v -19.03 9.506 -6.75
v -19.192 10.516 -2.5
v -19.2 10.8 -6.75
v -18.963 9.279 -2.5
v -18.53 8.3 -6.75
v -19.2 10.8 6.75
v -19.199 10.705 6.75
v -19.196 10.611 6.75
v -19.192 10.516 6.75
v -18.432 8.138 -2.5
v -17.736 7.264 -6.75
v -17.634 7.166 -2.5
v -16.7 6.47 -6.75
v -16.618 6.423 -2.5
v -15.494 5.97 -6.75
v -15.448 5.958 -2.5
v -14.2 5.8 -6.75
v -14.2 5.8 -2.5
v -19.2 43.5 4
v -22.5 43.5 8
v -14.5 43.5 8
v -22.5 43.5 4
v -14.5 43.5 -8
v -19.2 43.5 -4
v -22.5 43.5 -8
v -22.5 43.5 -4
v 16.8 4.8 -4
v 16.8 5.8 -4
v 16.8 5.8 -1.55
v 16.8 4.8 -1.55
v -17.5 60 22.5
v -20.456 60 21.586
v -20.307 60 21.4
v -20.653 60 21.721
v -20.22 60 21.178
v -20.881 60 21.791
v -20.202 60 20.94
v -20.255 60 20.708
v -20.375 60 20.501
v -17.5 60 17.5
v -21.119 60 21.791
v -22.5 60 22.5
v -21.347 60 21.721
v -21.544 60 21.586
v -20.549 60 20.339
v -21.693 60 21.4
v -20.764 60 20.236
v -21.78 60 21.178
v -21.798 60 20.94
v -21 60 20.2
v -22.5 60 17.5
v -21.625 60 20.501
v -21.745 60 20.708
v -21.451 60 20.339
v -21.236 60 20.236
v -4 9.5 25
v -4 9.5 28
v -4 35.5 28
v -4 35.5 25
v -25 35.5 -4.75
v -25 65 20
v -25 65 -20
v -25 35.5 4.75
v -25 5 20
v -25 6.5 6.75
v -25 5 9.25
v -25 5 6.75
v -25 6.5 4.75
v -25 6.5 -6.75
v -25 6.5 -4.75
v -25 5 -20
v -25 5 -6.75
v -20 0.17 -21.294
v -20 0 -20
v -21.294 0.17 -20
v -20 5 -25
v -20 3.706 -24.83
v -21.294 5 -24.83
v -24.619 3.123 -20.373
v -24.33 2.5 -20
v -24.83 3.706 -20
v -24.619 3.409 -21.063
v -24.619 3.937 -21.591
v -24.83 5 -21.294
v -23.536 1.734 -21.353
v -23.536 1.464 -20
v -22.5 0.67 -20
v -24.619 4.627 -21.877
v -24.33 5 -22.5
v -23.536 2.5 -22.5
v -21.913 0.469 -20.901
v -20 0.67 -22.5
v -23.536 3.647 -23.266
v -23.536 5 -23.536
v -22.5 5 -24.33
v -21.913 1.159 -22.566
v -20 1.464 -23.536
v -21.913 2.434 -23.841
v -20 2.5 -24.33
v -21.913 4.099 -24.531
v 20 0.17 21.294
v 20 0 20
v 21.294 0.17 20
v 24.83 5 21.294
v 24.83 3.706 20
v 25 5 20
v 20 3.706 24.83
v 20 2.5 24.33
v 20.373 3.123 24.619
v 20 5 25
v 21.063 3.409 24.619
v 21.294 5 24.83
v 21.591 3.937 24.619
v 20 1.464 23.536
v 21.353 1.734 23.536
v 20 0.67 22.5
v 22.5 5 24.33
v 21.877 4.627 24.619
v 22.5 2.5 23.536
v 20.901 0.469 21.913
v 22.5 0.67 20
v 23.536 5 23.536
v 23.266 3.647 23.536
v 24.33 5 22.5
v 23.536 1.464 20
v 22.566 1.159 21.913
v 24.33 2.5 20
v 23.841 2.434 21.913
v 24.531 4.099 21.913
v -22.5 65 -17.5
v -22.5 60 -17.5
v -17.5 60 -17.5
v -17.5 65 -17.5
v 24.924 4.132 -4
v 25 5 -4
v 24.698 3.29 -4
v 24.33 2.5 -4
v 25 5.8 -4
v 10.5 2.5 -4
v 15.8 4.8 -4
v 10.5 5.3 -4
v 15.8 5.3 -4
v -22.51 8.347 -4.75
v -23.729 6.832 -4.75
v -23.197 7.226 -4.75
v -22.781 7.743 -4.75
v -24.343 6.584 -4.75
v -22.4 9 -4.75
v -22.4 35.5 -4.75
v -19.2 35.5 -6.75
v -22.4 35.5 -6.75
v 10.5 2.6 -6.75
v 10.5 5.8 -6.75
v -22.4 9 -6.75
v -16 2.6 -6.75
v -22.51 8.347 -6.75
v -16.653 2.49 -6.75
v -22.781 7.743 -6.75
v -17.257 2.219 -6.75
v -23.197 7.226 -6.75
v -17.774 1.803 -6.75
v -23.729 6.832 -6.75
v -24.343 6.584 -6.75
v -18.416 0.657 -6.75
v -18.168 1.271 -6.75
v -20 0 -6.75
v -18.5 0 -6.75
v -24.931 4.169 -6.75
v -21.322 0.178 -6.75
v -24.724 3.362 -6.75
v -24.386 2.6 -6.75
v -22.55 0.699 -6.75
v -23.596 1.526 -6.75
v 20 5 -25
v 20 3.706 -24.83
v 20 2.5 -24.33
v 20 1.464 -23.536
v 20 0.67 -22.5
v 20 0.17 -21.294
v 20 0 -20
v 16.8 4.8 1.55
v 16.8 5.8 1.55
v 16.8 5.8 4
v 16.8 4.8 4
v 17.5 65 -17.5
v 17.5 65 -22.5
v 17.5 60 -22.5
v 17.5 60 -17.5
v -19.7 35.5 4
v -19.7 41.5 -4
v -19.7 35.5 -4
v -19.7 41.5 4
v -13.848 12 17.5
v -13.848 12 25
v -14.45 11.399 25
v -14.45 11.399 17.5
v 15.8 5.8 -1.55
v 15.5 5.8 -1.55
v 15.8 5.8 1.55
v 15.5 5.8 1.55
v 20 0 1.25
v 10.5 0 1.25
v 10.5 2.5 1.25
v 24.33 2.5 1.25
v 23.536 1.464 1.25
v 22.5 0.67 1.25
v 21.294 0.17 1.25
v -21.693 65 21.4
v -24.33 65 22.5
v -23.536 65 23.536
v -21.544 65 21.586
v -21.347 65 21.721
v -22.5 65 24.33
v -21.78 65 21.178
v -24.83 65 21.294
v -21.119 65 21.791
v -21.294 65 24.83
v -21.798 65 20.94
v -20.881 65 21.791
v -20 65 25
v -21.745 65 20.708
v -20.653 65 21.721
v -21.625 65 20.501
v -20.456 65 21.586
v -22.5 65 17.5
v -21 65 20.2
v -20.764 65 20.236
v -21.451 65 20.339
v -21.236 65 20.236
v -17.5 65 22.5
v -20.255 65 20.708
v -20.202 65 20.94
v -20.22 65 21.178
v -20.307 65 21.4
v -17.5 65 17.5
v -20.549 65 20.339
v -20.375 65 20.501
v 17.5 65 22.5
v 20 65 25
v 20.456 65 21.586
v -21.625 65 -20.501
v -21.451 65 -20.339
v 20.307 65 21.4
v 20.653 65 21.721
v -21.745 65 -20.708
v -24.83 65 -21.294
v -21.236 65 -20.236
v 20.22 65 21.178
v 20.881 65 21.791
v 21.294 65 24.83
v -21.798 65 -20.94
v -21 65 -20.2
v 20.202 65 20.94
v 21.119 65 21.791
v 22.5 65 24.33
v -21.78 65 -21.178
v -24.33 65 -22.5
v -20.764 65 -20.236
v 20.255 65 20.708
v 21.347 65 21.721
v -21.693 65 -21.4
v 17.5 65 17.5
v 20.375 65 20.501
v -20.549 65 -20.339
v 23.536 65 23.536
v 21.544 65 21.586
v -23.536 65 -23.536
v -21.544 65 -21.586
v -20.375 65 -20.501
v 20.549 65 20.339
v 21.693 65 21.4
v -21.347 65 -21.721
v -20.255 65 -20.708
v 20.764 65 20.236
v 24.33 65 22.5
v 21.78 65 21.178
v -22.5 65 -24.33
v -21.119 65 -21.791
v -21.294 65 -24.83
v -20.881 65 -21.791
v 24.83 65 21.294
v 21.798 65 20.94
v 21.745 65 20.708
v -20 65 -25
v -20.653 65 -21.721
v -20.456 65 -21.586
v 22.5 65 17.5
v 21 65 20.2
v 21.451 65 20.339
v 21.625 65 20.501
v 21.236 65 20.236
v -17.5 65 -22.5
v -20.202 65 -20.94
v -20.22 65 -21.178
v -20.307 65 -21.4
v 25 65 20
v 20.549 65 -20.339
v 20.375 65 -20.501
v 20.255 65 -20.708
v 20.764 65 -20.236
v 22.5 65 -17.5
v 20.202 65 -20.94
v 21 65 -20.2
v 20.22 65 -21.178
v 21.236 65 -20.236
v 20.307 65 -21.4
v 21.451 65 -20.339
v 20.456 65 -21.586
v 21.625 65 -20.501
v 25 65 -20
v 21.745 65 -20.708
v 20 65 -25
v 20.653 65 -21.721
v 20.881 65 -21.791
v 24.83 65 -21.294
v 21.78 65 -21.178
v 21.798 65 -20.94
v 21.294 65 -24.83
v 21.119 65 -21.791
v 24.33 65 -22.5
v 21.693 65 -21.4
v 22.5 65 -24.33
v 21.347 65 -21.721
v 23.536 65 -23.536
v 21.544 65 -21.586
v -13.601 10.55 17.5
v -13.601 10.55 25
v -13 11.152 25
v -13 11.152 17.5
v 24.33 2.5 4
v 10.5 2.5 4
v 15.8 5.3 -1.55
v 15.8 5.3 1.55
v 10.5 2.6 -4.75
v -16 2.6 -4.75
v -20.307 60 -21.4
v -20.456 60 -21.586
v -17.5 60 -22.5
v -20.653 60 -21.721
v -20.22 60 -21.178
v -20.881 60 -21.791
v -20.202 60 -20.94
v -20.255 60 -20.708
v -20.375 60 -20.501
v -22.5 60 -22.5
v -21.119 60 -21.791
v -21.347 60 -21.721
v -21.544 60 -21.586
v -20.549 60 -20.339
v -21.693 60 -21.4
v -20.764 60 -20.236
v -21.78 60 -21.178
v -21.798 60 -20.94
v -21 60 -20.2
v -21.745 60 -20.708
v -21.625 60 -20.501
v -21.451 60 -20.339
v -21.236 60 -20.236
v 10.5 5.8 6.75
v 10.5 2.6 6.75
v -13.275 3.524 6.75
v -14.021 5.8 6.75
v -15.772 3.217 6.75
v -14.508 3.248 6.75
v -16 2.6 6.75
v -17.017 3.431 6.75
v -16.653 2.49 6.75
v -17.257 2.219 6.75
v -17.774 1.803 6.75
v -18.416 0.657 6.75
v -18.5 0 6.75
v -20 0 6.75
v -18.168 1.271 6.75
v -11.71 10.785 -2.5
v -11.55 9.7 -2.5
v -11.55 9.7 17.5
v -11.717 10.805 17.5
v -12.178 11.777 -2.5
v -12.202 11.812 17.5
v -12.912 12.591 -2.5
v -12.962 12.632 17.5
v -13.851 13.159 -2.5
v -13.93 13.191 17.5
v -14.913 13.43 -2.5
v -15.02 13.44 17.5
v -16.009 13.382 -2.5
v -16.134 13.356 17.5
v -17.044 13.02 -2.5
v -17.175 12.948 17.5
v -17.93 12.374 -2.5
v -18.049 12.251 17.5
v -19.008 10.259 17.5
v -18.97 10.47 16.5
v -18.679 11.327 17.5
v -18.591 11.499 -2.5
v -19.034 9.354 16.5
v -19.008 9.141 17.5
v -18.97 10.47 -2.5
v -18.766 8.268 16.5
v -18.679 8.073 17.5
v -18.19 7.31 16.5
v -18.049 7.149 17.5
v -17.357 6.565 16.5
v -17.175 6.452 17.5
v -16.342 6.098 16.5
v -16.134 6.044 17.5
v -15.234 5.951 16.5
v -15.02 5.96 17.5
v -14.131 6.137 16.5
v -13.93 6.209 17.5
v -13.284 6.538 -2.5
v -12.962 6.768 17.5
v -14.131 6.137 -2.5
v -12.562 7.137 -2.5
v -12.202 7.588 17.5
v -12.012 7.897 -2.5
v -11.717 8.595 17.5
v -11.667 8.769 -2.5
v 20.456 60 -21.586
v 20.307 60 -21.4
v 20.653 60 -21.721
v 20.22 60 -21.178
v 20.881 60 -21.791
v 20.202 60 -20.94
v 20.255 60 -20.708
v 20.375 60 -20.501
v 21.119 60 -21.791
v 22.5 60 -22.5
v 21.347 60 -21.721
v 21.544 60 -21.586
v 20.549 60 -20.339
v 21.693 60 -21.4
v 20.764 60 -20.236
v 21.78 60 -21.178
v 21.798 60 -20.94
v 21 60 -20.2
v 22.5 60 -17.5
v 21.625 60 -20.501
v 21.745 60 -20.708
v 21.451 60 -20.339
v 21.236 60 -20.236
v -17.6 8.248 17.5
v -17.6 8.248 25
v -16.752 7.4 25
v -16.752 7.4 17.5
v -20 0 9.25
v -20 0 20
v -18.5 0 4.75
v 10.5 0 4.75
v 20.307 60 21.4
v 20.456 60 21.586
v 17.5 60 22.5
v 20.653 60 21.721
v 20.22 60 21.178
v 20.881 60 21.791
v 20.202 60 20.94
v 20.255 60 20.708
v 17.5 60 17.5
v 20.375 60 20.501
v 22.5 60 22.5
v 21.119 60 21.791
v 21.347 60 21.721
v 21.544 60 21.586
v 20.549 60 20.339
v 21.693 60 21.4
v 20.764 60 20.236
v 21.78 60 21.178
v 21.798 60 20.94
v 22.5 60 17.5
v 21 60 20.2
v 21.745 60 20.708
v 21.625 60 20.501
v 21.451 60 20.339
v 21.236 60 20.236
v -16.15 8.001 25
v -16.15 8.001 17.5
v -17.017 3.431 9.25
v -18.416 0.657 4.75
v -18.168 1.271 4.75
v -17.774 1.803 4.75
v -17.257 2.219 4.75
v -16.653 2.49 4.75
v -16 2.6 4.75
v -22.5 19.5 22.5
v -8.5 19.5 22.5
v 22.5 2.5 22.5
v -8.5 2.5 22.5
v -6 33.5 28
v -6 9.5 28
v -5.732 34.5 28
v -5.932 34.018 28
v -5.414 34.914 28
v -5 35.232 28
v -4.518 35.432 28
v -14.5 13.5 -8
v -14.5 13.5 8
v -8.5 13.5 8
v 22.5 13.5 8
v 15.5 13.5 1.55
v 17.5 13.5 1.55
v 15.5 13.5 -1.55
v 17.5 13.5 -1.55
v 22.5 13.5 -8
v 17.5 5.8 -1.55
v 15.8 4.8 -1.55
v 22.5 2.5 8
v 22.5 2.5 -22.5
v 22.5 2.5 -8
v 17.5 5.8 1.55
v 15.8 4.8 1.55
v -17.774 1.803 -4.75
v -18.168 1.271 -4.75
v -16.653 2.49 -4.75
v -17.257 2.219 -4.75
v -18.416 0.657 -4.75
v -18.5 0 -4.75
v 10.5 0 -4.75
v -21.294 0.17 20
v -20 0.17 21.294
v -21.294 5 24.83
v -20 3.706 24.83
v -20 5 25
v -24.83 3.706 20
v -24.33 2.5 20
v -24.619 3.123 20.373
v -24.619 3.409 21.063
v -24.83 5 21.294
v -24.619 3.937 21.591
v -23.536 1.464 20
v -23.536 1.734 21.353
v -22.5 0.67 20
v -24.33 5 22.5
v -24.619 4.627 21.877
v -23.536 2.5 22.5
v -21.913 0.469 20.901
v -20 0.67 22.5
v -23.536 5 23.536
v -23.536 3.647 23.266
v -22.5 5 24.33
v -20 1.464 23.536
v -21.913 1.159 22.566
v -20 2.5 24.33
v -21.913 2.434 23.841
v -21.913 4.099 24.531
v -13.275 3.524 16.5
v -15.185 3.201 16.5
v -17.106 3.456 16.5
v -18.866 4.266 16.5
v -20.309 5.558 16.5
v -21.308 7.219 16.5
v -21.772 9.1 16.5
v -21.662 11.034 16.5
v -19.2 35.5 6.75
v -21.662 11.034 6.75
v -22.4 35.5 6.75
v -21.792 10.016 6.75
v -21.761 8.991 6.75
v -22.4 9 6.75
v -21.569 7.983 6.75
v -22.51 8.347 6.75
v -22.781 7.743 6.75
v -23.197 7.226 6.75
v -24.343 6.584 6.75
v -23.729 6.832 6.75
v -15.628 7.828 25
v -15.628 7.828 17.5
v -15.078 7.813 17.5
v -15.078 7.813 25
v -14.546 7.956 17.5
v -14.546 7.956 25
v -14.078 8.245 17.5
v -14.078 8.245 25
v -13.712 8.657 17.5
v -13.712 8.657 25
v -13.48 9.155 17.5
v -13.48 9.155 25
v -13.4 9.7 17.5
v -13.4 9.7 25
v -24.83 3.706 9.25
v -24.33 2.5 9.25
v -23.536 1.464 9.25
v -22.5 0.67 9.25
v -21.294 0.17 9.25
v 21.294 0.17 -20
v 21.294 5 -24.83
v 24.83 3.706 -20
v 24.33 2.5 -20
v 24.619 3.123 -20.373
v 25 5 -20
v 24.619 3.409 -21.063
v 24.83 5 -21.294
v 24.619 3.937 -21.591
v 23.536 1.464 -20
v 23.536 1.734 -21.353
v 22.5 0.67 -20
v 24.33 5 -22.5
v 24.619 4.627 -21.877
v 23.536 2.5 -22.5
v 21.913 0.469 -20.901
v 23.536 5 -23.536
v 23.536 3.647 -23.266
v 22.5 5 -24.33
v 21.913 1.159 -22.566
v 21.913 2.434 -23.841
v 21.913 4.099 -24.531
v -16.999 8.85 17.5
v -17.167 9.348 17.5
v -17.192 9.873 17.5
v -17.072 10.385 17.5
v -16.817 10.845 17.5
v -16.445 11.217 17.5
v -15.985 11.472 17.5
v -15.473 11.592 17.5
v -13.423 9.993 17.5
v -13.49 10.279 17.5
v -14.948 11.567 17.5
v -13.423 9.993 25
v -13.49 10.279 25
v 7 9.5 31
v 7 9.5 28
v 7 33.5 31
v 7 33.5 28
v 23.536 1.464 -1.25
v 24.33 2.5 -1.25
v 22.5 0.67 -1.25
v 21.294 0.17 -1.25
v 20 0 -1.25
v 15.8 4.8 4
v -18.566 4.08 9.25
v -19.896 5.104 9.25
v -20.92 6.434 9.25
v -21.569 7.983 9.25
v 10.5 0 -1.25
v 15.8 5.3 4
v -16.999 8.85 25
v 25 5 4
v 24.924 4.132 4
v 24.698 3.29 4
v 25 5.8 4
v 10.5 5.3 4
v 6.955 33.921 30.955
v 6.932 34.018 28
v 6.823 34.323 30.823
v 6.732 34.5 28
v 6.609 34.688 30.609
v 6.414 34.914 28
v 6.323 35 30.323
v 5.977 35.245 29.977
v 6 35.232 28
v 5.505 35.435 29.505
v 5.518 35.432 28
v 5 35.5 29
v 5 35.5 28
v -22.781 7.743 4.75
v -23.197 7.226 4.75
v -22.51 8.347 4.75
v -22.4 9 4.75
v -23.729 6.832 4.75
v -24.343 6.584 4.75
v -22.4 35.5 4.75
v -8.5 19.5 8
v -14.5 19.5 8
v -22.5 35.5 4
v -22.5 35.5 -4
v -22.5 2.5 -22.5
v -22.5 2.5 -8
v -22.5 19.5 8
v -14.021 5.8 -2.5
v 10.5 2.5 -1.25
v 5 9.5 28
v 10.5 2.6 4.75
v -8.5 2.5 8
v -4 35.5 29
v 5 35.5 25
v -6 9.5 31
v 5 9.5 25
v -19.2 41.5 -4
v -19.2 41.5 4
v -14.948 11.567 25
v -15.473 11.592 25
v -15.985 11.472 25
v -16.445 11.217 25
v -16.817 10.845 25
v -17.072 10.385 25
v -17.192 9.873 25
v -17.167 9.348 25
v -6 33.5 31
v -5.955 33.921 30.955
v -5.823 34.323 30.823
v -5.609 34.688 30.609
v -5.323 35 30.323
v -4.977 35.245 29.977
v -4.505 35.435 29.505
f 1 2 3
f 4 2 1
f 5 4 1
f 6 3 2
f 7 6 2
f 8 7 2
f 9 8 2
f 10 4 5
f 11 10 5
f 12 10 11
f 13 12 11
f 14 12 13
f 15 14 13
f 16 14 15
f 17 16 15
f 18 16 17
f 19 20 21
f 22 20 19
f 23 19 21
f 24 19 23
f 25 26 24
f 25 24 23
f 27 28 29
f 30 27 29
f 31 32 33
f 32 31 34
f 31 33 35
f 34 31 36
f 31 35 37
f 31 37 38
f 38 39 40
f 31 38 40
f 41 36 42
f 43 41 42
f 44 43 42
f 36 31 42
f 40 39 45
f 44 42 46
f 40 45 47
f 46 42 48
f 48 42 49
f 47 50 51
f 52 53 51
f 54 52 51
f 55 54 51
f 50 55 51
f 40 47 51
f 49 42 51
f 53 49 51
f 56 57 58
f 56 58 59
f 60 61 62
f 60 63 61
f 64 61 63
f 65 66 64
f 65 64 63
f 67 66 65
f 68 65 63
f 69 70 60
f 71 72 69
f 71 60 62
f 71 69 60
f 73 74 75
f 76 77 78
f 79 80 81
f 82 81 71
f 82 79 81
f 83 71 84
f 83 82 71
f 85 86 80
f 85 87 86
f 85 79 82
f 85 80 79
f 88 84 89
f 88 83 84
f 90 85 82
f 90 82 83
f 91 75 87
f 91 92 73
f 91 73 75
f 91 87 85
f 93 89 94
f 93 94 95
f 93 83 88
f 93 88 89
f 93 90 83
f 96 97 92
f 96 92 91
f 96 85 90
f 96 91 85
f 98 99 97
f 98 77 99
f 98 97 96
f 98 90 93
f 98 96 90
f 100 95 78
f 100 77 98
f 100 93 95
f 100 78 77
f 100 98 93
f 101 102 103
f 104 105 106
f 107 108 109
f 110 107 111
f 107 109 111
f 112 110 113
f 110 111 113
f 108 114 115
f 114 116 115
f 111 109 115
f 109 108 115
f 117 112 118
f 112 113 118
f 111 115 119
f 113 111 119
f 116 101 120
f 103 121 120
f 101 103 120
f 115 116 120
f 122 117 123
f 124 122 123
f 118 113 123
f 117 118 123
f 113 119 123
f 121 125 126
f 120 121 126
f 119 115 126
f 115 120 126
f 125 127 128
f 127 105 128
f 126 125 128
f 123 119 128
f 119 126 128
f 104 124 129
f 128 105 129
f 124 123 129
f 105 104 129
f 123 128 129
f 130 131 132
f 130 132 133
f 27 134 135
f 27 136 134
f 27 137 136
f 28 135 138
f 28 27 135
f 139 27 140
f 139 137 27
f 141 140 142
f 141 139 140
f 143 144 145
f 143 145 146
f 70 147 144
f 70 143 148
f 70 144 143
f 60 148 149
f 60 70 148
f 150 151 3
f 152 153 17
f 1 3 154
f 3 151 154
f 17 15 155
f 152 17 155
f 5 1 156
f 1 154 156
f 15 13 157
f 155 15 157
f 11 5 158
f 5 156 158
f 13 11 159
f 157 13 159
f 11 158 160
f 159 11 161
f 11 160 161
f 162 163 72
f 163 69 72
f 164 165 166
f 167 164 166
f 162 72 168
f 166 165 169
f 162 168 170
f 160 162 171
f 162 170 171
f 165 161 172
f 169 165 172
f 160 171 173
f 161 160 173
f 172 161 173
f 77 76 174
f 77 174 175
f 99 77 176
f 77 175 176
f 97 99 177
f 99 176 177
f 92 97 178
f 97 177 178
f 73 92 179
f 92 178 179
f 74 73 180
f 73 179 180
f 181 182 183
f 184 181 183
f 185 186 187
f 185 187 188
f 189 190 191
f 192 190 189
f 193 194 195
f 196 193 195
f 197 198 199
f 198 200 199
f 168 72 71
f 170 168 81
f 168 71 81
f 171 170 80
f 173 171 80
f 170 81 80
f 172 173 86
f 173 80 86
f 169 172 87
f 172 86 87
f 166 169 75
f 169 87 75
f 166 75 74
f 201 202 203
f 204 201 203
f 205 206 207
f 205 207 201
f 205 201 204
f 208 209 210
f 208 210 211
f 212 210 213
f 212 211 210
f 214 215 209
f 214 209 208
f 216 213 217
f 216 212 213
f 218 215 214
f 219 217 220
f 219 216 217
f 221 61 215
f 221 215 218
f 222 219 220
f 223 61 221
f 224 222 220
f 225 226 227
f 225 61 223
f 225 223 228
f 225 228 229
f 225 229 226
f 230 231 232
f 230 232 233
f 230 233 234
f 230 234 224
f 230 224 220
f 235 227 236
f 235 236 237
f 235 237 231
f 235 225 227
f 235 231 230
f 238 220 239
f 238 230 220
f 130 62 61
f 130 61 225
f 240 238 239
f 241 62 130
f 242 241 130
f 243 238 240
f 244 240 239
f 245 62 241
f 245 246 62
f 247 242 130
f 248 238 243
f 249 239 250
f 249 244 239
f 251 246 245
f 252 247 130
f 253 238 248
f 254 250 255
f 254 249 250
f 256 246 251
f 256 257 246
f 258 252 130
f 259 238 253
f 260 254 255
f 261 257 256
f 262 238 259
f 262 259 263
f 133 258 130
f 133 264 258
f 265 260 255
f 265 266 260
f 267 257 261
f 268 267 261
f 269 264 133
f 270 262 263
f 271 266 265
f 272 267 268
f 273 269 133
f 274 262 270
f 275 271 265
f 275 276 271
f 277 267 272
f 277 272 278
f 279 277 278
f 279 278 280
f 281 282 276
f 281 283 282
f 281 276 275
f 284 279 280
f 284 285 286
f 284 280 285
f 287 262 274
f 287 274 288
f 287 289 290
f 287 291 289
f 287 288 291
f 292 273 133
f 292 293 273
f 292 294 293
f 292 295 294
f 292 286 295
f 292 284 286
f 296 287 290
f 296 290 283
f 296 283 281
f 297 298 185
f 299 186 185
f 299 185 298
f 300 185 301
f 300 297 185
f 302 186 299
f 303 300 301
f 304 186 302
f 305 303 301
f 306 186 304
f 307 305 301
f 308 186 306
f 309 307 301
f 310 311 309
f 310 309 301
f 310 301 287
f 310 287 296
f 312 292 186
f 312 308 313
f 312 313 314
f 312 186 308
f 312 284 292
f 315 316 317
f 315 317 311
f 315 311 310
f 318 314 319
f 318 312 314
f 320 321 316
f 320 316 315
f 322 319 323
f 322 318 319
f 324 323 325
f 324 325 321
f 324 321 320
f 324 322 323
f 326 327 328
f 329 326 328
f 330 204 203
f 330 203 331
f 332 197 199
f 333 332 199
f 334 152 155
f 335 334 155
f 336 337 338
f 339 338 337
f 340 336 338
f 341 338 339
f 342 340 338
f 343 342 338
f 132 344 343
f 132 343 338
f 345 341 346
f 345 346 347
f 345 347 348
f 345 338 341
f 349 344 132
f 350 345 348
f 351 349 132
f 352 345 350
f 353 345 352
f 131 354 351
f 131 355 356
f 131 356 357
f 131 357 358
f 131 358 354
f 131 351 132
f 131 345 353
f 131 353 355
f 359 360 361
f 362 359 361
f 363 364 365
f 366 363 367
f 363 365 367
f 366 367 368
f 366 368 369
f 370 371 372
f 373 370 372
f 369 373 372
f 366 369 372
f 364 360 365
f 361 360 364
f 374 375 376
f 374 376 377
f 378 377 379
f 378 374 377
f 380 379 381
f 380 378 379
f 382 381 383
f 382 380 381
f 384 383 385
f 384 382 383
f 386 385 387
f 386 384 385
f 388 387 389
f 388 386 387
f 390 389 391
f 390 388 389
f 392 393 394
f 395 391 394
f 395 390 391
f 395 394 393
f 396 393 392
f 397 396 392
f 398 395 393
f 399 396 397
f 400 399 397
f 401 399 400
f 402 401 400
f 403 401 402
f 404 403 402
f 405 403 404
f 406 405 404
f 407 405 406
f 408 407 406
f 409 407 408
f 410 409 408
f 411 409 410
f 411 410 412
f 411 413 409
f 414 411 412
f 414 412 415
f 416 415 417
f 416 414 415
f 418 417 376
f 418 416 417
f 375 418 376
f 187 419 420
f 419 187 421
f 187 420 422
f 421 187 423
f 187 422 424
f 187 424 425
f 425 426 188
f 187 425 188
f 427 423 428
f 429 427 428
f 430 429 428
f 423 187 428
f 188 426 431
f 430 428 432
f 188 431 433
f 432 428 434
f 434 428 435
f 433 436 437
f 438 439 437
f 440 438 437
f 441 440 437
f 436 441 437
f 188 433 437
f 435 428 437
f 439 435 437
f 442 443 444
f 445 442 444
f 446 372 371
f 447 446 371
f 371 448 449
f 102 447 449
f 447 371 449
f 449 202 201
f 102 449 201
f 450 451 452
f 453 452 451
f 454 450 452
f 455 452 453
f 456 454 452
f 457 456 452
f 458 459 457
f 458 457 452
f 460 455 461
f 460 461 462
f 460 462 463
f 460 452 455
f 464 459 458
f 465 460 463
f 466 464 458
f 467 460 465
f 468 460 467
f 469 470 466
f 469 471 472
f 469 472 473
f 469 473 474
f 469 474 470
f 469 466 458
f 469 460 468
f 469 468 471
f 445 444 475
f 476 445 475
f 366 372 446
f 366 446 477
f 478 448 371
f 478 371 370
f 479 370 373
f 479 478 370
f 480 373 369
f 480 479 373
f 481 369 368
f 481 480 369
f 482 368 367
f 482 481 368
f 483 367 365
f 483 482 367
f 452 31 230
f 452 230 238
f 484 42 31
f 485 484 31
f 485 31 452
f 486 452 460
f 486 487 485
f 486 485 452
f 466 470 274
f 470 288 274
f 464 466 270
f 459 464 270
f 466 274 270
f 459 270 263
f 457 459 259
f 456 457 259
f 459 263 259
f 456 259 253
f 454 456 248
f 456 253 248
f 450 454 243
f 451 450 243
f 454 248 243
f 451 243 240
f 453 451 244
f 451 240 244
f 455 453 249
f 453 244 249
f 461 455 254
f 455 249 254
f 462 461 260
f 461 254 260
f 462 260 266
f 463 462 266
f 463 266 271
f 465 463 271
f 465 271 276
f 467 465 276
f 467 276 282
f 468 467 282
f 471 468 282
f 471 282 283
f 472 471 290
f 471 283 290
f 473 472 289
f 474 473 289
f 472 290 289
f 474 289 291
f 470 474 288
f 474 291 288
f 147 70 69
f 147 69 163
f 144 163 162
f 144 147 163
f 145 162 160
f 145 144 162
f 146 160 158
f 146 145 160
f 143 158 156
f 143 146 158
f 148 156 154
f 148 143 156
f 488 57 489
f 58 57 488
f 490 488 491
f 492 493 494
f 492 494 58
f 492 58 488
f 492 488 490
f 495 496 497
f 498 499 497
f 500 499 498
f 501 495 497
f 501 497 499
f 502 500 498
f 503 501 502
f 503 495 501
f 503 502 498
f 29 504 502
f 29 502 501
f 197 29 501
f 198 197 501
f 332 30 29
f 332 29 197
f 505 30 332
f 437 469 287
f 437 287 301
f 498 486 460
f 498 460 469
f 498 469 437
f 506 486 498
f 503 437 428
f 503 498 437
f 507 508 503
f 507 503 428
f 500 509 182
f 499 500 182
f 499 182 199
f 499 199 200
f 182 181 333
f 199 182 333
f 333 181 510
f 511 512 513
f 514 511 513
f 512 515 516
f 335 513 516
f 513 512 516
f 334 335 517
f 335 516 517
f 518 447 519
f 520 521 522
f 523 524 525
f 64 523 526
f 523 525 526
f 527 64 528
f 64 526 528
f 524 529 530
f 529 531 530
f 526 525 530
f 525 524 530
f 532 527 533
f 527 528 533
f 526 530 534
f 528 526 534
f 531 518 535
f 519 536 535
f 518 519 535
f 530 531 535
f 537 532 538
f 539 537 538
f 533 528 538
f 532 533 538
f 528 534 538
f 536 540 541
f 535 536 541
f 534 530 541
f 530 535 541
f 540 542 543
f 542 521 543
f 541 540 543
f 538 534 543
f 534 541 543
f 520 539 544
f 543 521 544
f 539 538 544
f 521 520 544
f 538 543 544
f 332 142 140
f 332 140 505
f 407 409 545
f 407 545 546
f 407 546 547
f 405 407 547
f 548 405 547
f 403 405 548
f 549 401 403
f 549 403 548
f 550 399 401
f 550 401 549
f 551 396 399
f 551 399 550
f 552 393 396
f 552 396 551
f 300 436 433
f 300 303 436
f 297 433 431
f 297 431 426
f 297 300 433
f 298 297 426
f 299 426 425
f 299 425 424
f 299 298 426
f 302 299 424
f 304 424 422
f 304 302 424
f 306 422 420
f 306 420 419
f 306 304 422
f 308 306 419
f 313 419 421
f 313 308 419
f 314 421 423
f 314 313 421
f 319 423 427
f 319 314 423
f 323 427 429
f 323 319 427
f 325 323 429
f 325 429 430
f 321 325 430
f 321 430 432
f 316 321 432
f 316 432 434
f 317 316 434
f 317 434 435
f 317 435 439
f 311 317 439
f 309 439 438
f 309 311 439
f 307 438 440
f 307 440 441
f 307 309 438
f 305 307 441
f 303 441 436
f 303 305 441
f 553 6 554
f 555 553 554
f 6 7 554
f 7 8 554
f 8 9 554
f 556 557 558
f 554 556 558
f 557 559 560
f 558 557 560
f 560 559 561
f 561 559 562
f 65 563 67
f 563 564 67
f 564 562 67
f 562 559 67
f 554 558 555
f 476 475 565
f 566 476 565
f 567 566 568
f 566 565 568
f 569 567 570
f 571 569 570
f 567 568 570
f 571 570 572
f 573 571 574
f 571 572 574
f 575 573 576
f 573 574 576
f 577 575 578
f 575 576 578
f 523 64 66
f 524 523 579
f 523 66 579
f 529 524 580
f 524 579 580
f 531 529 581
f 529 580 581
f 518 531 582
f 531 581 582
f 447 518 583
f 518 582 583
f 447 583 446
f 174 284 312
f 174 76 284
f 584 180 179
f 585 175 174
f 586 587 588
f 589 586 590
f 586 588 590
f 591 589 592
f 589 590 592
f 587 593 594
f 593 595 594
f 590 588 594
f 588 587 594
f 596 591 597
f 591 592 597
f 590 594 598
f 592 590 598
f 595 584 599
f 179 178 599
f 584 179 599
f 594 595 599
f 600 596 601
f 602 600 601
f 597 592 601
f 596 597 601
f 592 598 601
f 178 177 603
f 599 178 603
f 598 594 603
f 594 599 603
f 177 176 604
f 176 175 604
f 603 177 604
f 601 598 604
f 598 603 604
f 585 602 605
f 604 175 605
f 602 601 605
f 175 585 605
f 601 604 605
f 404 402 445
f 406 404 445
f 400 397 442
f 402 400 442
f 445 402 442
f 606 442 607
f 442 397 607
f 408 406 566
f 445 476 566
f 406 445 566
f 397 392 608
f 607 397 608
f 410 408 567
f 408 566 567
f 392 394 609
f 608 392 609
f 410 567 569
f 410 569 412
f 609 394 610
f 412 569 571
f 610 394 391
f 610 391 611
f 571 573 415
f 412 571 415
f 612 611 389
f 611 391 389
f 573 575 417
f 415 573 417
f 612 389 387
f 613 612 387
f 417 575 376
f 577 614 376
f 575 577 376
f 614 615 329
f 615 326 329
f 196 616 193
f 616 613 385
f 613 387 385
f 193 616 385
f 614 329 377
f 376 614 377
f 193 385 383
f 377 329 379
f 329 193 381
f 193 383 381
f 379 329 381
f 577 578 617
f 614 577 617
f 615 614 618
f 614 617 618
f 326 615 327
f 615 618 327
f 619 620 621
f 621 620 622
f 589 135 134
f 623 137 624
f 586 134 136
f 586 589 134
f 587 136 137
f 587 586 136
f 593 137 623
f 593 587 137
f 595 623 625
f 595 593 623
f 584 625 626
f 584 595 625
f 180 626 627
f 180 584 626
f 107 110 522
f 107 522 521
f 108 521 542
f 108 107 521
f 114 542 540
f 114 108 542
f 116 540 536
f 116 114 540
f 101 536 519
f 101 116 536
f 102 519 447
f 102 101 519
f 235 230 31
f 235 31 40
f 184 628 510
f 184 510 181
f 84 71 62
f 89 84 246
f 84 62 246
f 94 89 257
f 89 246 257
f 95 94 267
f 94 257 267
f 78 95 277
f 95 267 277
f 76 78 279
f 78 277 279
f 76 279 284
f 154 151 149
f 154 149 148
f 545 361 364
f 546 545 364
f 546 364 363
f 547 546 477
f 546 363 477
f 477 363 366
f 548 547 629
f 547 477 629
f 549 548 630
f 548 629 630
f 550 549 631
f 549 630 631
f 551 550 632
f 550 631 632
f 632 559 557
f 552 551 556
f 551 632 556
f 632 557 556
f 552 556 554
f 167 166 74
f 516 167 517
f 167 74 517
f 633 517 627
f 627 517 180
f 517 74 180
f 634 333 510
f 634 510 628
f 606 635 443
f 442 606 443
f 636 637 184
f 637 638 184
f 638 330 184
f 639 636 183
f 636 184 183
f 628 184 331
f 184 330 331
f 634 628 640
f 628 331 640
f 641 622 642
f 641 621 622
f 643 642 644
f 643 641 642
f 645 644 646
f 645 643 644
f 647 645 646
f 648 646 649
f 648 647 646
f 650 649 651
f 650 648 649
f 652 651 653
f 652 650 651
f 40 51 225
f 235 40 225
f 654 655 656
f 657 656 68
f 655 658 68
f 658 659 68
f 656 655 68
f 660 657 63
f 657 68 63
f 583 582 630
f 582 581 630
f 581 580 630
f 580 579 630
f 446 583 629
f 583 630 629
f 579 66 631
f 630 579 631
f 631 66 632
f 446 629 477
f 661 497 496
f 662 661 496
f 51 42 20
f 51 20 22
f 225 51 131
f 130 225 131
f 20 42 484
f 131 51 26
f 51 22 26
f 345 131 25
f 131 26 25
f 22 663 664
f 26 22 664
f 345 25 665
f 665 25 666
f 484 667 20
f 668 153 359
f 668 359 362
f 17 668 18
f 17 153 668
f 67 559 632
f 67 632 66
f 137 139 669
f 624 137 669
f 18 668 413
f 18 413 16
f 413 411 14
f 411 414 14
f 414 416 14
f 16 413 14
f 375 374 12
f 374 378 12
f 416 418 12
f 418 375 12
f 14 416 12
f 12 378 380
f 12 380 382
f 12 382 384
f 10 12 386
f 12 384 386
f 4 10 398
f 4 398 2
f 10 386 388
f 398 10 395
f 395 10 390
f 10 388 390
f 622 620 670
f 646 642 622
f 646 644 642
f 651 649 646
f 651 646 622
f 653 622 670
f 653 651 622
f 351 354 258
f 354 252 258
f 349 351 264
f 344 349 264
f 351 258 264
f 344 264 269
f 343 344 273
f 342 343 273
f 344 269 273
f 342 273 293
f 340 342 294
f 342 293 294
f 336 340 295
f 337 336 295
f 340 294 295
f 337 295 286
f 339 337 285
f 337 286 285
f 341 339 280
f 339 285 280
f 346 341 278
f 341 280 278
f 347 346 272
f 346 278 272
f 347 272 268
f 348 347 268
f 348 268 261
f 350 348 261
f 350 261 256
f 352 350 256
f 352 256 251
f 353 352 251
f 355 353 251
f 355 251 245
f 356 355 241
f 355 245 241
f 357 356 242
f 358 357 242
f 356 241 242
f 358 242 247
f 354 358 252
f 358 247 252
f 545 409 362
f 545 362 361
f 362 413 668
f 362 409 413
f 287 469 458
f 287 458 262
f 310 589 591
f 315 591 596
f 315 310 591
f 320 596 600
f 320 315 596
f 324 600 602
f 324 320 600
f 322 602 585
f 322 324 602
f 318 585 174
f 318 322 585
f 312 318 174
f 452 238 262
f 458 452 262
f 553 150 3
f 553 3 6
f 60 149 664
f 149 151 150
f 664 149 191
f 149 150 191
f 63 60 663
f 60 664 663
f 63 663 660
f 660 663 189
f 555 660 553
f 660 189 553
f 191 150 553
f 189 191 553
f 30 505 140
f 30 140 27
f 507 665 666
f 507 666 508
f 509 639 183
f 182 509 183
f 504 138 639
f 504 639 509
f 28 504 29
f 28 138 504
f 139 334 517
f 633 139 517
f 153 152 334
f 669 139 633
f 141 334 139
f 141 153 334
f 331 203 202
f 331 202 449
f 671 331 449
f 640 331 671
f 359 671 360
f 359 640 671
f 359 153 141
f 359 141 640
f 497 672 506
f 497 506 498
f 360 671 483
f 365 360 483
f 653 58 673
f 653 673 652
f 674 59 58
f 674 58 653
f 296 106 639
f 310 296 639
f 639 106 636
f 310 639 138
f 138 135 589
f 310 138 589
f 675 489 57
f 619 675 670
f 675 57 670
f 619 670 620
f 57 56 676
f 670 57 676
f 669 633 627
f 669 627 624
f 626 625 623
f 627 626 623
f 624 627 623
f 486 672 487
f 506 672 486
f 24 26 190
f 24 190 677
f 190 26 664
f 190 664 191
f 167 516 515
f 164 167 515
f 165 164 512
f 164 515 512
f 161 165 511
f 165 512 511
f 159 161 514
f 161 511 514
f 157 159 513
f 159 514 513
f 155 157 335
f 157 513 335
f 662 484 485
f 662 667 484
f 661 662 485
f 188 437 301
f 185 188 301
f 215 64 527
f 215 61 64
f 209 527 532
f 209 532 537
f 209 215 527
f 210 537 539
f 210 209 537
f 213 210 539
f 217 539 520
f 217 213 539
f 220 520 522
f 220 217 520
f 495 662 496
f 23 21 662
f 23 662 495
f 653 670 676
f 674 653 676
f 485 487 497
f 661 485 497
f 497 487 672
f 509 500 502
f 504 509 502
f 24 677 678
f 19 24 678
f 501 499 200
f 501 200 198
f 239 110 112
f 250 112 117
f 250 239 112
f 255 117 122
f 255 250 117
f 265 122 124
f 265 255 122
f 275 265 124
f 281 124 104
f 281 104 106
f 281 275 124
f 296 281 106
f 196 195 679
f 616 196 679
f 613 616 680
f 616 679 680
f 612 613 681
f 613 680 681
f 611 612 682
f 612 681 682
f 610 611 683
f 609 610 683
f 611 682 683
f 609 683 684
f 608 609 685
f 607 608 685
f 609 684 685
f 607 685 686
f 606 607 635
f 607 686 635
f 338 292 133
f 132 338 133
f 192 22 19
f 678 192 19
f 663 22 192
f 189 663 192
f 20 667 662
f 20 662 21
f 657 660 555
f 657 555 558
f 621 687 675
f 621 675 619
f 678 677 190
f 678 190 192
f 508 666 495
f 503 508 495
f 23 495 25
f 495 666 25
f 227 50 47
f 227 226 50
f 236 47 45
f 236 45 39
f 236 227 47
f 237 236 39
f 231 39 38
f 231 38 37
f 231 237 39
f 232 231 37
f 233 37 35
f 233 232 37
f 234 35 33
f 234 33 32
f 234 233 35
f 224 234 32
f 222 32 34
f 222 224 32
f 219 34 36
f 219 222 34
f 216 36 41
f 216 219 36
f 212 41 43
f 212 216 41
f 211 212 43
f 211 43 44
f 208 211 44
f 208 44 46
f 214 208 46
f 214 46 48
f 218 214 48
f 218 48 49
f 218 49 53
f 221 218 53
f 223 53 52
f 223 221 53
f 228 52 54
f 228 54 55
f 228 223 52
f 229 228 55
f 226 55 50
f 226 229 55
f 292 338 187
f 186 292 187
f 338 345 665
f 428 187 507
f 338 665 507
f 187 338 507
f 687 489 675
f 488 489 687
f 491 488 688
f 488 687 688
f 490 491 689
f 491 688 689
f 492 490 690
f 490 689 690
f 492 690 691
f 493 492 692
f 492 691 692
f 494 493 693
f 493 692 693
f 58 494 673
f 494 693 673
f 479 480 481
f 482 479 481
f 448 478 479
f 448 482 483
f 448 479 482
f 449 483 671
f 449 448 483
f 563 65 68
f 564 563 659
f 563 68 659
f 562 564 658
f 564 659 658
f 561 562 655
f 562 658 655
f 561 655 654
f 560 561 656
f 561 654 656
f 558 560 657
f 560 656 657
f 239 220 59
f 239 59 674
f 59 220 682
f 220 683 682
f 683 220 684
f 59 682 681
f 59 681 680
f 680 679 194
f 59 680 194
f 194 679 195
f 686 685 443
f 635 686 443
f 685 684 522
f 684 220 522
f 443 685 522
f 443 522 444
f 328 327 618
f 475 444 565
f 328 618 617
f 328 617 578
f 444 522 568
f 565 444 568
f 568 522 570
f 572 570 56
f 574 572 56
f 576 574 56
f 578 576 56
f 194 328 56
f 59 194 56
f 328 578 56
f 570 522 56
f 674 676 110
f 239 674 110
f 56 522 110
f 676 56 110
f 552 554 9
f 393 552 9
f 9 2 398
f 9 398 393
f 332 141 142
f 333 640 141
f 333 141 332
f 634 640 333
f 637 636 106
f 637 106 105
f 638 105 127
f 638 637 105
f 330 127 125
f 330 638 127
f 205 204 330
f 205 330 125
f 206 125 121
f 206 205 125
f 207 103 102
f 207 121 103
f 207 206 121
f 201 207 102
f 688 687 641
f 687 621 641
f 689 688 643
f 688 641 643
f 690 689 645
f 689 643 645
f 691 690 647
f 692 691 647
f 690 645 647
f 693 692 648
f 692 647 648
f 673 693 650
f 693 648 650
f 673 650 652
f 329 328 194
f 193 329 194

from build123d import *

# Parameters (mm, degrees)
SKETCH1_W                             = 50
SKETCH1_H                             = 50
BASE_SHELL_DEPTH                      = 65
SHELL1_T                              = -2.5
FILLET1_R                             = 5
SKETCH2_W                             = 13
SKETCH2_H                             = 26
LOCK_CONNECTOR_EXTRUDE_DEPTH          = 6
SKETCH3_W                             = 3
SKETCH3_H                             = 2
LOCK_CONNECTOR_CUT_DEPTH              = 54.350257731
LOCK_CONNECTOR_FILLET_R               = 2
SKETCH8_W                             = 45
SKETCH8_H                             = 16
BOTTOM_CONNECTOR_INSIDE_DEPTH         = 11
SKETCH10_W                            = 35.5
SKETCH10_H                            = 9.5
BOTTOM_FEMALE_BOTTOM_CUT_DEPTH        = 2.6
SKETCH7_W                             = 35.5
SKETCH7_H                             = 13.5
BOTTOM_FEMALE_TOP_CUT_DEPTH           = 3.2
ROUNDED_ENTRANCE_REACH                = 80.282
ROUNDED_ENTRANCE_DIRECTION_2_REACH    = 80.282
SKETCH22_W                            = 8
SKETCH22_H                            = 3.3
HEADER_PIN_CUT_DEPTH                  = 81.288542146
HEADER_PIN_HOLDER_REACH               = 78.23
SKETCH23_W                            = 14.435585072
SKETCH23_H                            = 2.5
SKETCH25_W                            = 2
SKETCH25_H                            = 3.1
WIRE_CUT_DEPTH                        = 72.348721082
SKETCH57_W                            = 1
SKETCH57_H                            = 2.45
PIN_STOPPER_DEPTH                     = 1
SKETCH15_W                            = 16
SKETCH15_H                            = 30
SIDE_CONNECTOR_INSIDE_DEPTH           = 8
SKETCH58_W                            = 3.3
SKETCH58_H                            = 8
CUT_EXTRUDE7_DEPTH                    = 54.350257731
SKETCH14_R                            = 1.25
LOCK_BOTTOM_SUPPORT_DEPTH             = 4.5
SKETCH61_W                            = 5
SKETCH61_H                            = 5
BOSS_EXTRUDE12_DEPTH                  = 5
MIRROR2_COPY_1_SKETCH_W               = 5
MIRROR2_COPY_1_SKETCH_H               = 5
MIRROR2_COPY_1_DEPTH                  = 5
LOCK_SUPPORT_DEPTH                    = 17
LOCK_CUT_DEPTH                        = 19.5
SKETCH11_R                            = 3.75
SPRING_GAP_DEPTH                      = 20
FLANG_GAP_DEPTH                       = 19
FLANG_SCREW_CUT_DEPTH                 = 2.5
FILLET2_R                             = 5
SKETCH59_W                            = 5.3
SKETCH59_H                            = 8
SIDE_CONNECTOR_BOTTOM_SUPPORT_DEPTH   = 0.5
SKETCH60_W                            = 8
SKETCH60_H                            = 6
BOTTOM_CONNECTOR_BOTTOM_SUPPORT_DEPTH = 0.5


with BuildPart() as part:
    # Sketch1 → base shell (new body)
    with BuildSketch(Plane(origin=(0, 0, 0), x_dir=(1, 0, 0), z_dir=(0, 1, 0))):
        Rectangle(SKETCH1_W, SKETCH1_H)
    extrude(amount=BASE_SHELL_DEPTH)

    # Shell1
    shell1_openings = [part.faces().sort_by_distance(p)[0] for p in [
        (0, 65, 0),
    ]]
    offset(amount=SHELL1_T, openings=shell1_openings, kind=Kind.INTERSECTION)

    # Fillet1
    fillet1_edges = [part.edges().sort_by_distance(p)[0] for p in [
        (0, 0, -25),
        (25, 0, 0),
        (0, 0, 25),
        (-25, 0, 0),
        (-25, 32.5, -25),
        (25, 32.5, -25),
        (25, 32.5, 25),
        (-25, 32.5, 25),
    ]]
    fillet(fillet1_edges, radius=FILLET1_R)

    # Sketch2 → lock connector extrude (add)
    with BuildSketch(Plane.XY.offset(25)):
        with Locations((0.5, 22.5)):
            Rectangle(SKETCH2_W, SKETCH2_H)
    extrude(amount=LOCK_CONNECTOR_EXTRUDE_DEPTH)

    # Sketch3 → lock connector cut (cut, through all)
    with BuildSketch(Plane(origin=(0, 35.5, 0), x_dir=(0, 0, -1), z_dir=(0, 1, 0))):
        with Locations((-26.5, -6)):
            Rectangle(SKETCH3_W, SKETCH3_H)
        with Locations((-26.5, 5)):
            Rectangle(SKETCH3_W, SKETCH3_H)
    extrude(amount=-LOCK_CONNECTOR_CUT_DEPTH, mode=Mode.SUBTRACT)

    # lock connector fillet
    lock_connector_fillet_edges = [part.edges().sort_by_distance(p)[0] for p in [
        (7, 35.5, 29.5),
        (-6, 35.5, 29.5),
        (0.5, 35.5, 31),
    ]]
    fillet(lock_connector_fillet_edges, radius=LOCK_CONNECTOR_FILLET_R)

    # Sketch8 → bottom connector inside (add)
    with BuildSketch(Plane(origin=(0, 2.5, 0), x_dir=(1, 0, 0), z_dir=(0, 1, 0))):
        Rectangle(SKETCH8_W, SKETCH8_H)
    extrude(amount=BOTTOM_CONNECTOR_INSIDE_DEPTH)

    # Sketch10 → bottom female bottom cut (cut)
    with BuildSketch(Plane.XZ):
        with Locations((-7.25, 0)):
            Rectangle(SKETCH10_W, SKETCH10_H)
    bottom_female_bottom_cut = extrude(amount=-BOTTOM_FEMALE_BOTTOM_CUT_DEPTH, mode=Mode.SUBTRACT)

    # Sketch7 → bottom female top cut (cut)
    with BuildSketch(Plane(origin=(0, 2.6, 0), x_dir=(-1, 0, 0), z_dir=(0, -1, 0))):
        with Locations((7.25, 0)):
            Rectangle(SKETCH7_W, SKETCH7_H)
    bottom_female_top_cut = extrude(amount=-BOTTOM_FEMALE_TOP_CUT_DEPTH, mode=Mode.SUBTRACT)

    # rounded entrance: up to this face of the body (flat: up to its plane)
    rounded_entrance_end = Plane(part.part.faces().sort_by_distance((-7.175733888, 4.204259527, -6.75))[0])
    # Sketch26 → rounded entrance (cut, up to the picked face)
    with BuildSketch(Plane.XY.offset(-4.75), mode=Mode.PRIVATE) as rounded_entrance_sk1:
        with BuildLine():
            Line((-16, 2.6), (-24.38634244, 2.6))
            ThreePointArc((-24.38634244, 2.6), (-22.549509757, 0.698837366), (-20, 0))
            Line((-20, 0), (-18.5, 0))
            ThreePointArc((-18.5, 0), (-17.773607635, 1.80346888), (-16, 2.6))
        make_face()
    rounded_entrance_tool1 = split(extrude(rounded_entrance_sk1.sketch, amount=-ROUNDED_ENTRANCE_REACH, mode=Mode.PRIVATE), bisect_by=rounded_entrance_end, keep=Keep.BOTH, mode=Mode.PRIVATE)
    rounded_entrance = rounded_entrance_tool1.solids().sort_by(Axis((-20.596969, 1.517539, -4.75), (0, 0, -1)))[0]
    add(rounded_entrance, mode=Mode.SUBTRACT)

    # rounded entrance direction 2: up to this face of the body (flat: up to its plane)
    rounded_entrance_direction_2_end = Plane(part.part.faces().sort_by_distance((-7.175733888, 4.204259527, 6.75))[0])
    # Sketch26 → rounded entrance direction 2 (cut, up to the picked face)
    with BuildSketch(Plane.XY.offset(-4.75), mode=Mode.PRIVATE) as rounded_entrance_direction_2_sk1:
        with BuildLine():
            Line((-16, 2.6), (-24.38634244, 2.6))
            ThreePointArc((-24.38634244, 2.6), (-22.549509757, 0.698837366), (-20, 0))
            Line((-20, 0), (-18.5, 0))
            ThreePointArc((-18.5, 0), (-17.773607635, 1.80346888), (-16, 2.6))
        make_face()
    rounded_entrance_direction_2_tool1 = split(extrude(rounded_entrance_direction_2_sk1.sketch, amount=ROUNDED_ENTRANCE_DIRECTION_2_REACH, mode=Mode.PRIVATE), bisect_by=rounded_entrance_direction_2_end, keep=Keep.BOTH, mode=Mode.PRIVATE)
    rounded_entrance_direction_2 = rounded_entrance_direction_2_tool1.solids().sort_by(Axis((-20.596969, 1.517539, -4.75), (0, 0, 1)))[0]
    add(rounded_entrance_direction_2, mode=Mode.SUBTRACT)

    # Sketch22 → header pin cut (cut, through all)
    with BuildSketch(Plane.ZY.offset(-10.5)):
        with Locations((0, 4.15)):
            Rectangle(SKETCH22_W, SKETCH22_H)
    extrude(amount=-HEADER_PIN_CUT_DEPTH, mode=Mode.SUBTRACT)

    # Sketch23 → header pin holder (cut, up to next)
    with BuildSketch(Plane.XZ, mode=Mode.PRIVATE) as header_pin_holder_sk1:
        with Locations((17.717792536, 0)):
            Rectangle(SKETCH23_W, SKETCH23_H)
    header_pin_holder_tool1 = extrude(header_pin_holder_sk1.sketch, amount=-HEADER_PIN_HOLDER_REACH, mode=Mode.PRIVATE) & part.part
    add(header_pin_holder_tool1.solids().sort_by_distance((17.717793, 0, 0))[0], mode=Mode.SUBTRACT)

    # Sketch25 → wire cut (cut, through all)
    with BuildSketch(Plane(origin=(0, 5.8, 0), x_dir=(-1, 0, 0), z_dir=(0, -1, 0))):
        with Locations((-16.5, 0)):
            Rectangle(SKETCH25_W, SKETCH25_H)
    extrude(amount=-WIRE_CUT_DEPTH, mode=Mode.SUBTRACT)

    # Sketch57 → pin stopper (add)
    with BuildSketch(Plane.XZ.offset(-5.8)):
        with Locations((16.3, 2.775)):
            Rectangle(SKETCH57_W, SKETCH57_H)
        with Locations((16.3, -2.775)):
            Rectangle(SKETCH57_W, SKETCH57_H)
    extrude(amount=PIN_STOPPER_DEPTH)

    # Sketch15 → side connector inside (add)
    with BuildSketch(Plane(origin=(-22.5, 0, 0), x_dir=(0, 0, -1), z_dir=(1, 0, 0))):
        with Locations((0, 28.5)):
            Rectangle(SKETCH15_W, SKETCH15_H)
    extrude(amount=SIDE_CONNECTOR_INSIDE_DEPTH)

    # side connector mirror: bottom female bottom cut, bottom female top cut, rounded entrance, rounded entrance direction 2 across plane
    add(bottom_female_bottom_cut.mirror(Plane(origin=(-12.5, 12.5, 0), x_dir=(0, 0, 1), z_dir=(0.7071067811865488, -0.7071067811865464, 0))), mode=Mode.SUBTRACT)
    add(bottom_female_top_cut.mirror(Plane(origin=(-12.5, 12.5, 0), x_dir=(0, 0, 1), z_dir=(0.7071067811865488, -0.7071067811865464, 0))), mode=Mode.SUBTRACT)
    add(rounded_entrance.mirror(Plane(origin=(-12.5, 12.5, 0), x_dir=(0, 0, 1), z_dir=(0.7071067811865488, -0.7071067811865464, 0))), mode=Mode.SUBTRACT)
    add(rounded_entrance_direction_2.mirror(Plane(origin=(-12.5, 12.5, 0), x_dir=(0, 0, 1), z_dir=(0.7071067811865488, -0.7071067811865464, 0))), mode=Mode.SUBTRACT)

    # Sketch58 → Cut-Extrude7 (cut, through all)
    with BuildSketch(Plane.XZ.offset(-35.5)):
        with Locations((-20.85, 0)):
            Rectangle(SKETCH58_W, SKETCH58_H)
    extrude(amount=-CUT_EXTRUDE7_DEPTH, mode=Mode.SUBTRACT)

    # Sketch14 → Lock bottom support (add)
    with BuildSketch(Plane.XY.offset(-6.75)):
        with Locations((-15.3, 9.7)):
            Circle(SKETCH14_R)
    extrude(amount=LOCK_BOTTOM_SUPPORT_DEPTH)

    # Sketch61 → Boss-Extrude12 (add)
    with BuildSketch(Plane.ZY.offset(-22.5)):
        with Locations((-20, 62.5)):
            Rectangle(SKETCH61_W, SKETCH61_H)
    boss_extrude12 = extrude(amount=BOSS_EXTRUDE12_DEPTH)

    # Sketch29 → M2 Tapped Hole1 (revolve, cut)
    with BuildSketch(Plane(origin=(21, 65, -21), x_dir=(0, 0, 1), z_dir=(1, 0, 0))):
        Polygon((0, 0), (0, 5.480688495), (0.8, 5), (0.8, 0), align=None)
    m2_tapped_hole1 = revolve(axis=Axis((21, 71.35, -21), (0, -1, 0)), mode=Mode.SUBTRACT)

    # Mirror1: Boss-Extrude12, M2 Tapped Hole1 across plane
    add(boss_extrude12.mirror(Plane(origin=(0, 0, 0), x_dir=(0, 0, 1), z_dir=(1, 0, 0))))
    add(m2_tapped_hole1.mirror(Plane(origin=(0, 0, 0), x_dir=(0, 0, 1), z_dir=(1, 0, 0))), mode=Mode.SUBTRACT)

    # Mirror2: Boss-Extrude12, M2 Tapped Hole1 across plane
    add(boss_extrude12.mirror(Plane.XY))
    add(m2_tapped_hole1.mirror(Plane.XY), mode=Mode.SUBTRACT)

    # Mirror2 copy 1 sketch → Mirror2 copy 1 (add)
    with BuildSketch(Plane(origin=(-22.5, 0, 0), x_dir=(0, 0, -1), z_dir=(1, 0, 0))):
        with Locations((-20, 62.5)):
            Rectangle(MIRROR2_COPY_1_SKETCH_W, MIRROR2_COPY_1_SKETCH_H)
    extrude(amount=MIRROR2_COPY_1_DEPTH)

    # Mirror2 copy 2 sketch → Mirror2 copy 2 (revolve, cut)
    with BuildSketch(Plane(origin=(-21, 65, 21), x_dir=(0, 0, -1), z_dir=(-1, 0, 0))):
        Polygon((0, 0), (0, 5.480688495), (0.8, 5), (0.8, 0), align=None)
    revolve(axis=Axis((-21, 71.35, 21), (0, -1, 0)), mode=Mode.SUBTRACT)

    # Sketch41 → lock support (add)
    with BuildSketch(Plane(origin=(0, 2.5, 0), x_dir=(1, 0, 0), z_dir=(0, 1, 0))):
        Polygon((-22.5, -22.5), (-8.5, -22.5), (-8.5, -8), (-22.5, -8), (-22.5, -17), align=None)
    extrude(amount=LOCK_SUPPORT_DEPTH)

    # Sketch6 → lock cut (cut)
    with BuildSketch(Plane.XY.offset(25)):
        with BuildLine():
            ThreePointArc((-16.15049081, 8.000981053), (-16.643502884, 8.356497116), (-16.999018947, 8.84950919))
            Line((-16.999018947, 8.84950919), (-17.600059711, 8.248468426))
            Line((-17.600059711, 8.248468426), (-16.751531574, 7.399940289))
            Line((-16.751531574, 7.399940289), (-16.15049081, 8.000981053))
        make_face()
        with BuildLine():
            ThreePointArc((-14.44950919, 11.399018947), (-13.956497116, 11.043502884), (-13.600981053, 10.55049081))
            Line((-13.600981053, 10.55049081), (-12.999940289, 11.151531574))
            Line((-12.999940289, 11.151531574), (-13.848468426, 12.000059711))
            Line((-13.848468426, 12.000059711), (-14.44950919, 11.399018947))
        make_face()
        with BuildLine():
            ThreePointArc((-13.4, 9.7), (-13.4509278, 10.136957664), (-13.600981053, 10.55049081))
            ThreePointArc((-13.600981053, 10.55049081), (-13.956497116, 11.043502884), (-14.44950919, 11.399018947))
            ThreePointArc((-14.44950919, 11.399018947), (-16.643502884, 11.043502884), (-16.999018947, 8.84950919))
            ThreePointArc((-16.999018947, 8.84950919), (-16.643502884, 8.356497116), (-16.15049081, 8.000981053))
            ThreePointArc((-16.15049081, 8.000981053), (-14.301484236, 8.083532781), (-13.4, 9.7))
        make_face()
    extrude(amount=-LOCK_CUT_DEPTH, mode=Mode.SUBTRACT)

    # Sketch11 → Spring gap (cut)
    with BuildSketch(Plane.XY.offset(-2.5)):
        with Locations((-15.3, 9.7)):
            Circle(SKETCH11_R)
    extrude(amount=SPRING_GAP_DEPTH, mode=Mode.SUBTRACT)

    # Sketch12 → Flang gap (cut)
    with BuildSketch(Plane.XY.offset(-2.5)):
        with BuildLine():
            Line((-15.3, 9.7), (-13.274593025, 3.523615411))
            ThreePointArc((-13.274593025, 3.523615411), (-19.63620247, 4.857753812), (-21.661609445, 11.034138401))
            Line((-21.661609445, 11.034138401), (-15.3, 9.7))
        make_face()
    extrude(amount=FLANG_GAP_DEPTH, mode=Mode.SUBTRACT)

    # Sketch52 → flang screw cut (cut)
    with BuildSketch(Plane(origin=(0, 0, 6.75), x_dir=(-1, 0, 0), z_dir=(0, 0, -1))):
        with BuildLine():
            Line((21.568994271, 7.982527778), (25, 5))
            add(Edge.make_bspline(
                [(25, 5), (26.808053779, 2.347485232), (22.598490609, -3.321737418), (20, 0)],
                knots=[0, 0, 0, 0, 1, 1, 1, 1], degree=3))
            Line((20, 0), (17.017472222, 3.431005729))
            Line((17.017472222, 3.431005729), (21.568994271, 7.982527778))
        make_face()
    extrude(amount=-FLANG_SCREW_CUT_DEPTH, mode=Mode.SUBTRACT)

    # Fillet2
    fillet2_edges = [part.edges().sort_by_distance(p)[0] for p in [
        (-19.2, 5.8, -4.625),
    ]]
    fillet(fillet2_edges, radius=FILLET2_R)

    # Sketch59 → side connector bottom support (add)
    with BuildSketch(Plane.XZ.offset(-5.8)):
        with Locations((13.15, 0)):
            Rectangle(SKETCH59_W, SKETCH59_H)
    extrude(amount=SIDE_CONNECTOR_BOTTOM_SUPPORT_DEPTH)

    # Sketch60 → bottom connector bottom support (add)
    with BuildSketch(Plane.ZY.offset(19.2)):
        with Locations((0, 38.5)):
            Rectangle(SKETCH60_W, SKETCH60_H)
    extrude(amount=BOTTOM_CONNECTOR_BOTTOM_SUPPORT_DEPTH)


solid = part.part
